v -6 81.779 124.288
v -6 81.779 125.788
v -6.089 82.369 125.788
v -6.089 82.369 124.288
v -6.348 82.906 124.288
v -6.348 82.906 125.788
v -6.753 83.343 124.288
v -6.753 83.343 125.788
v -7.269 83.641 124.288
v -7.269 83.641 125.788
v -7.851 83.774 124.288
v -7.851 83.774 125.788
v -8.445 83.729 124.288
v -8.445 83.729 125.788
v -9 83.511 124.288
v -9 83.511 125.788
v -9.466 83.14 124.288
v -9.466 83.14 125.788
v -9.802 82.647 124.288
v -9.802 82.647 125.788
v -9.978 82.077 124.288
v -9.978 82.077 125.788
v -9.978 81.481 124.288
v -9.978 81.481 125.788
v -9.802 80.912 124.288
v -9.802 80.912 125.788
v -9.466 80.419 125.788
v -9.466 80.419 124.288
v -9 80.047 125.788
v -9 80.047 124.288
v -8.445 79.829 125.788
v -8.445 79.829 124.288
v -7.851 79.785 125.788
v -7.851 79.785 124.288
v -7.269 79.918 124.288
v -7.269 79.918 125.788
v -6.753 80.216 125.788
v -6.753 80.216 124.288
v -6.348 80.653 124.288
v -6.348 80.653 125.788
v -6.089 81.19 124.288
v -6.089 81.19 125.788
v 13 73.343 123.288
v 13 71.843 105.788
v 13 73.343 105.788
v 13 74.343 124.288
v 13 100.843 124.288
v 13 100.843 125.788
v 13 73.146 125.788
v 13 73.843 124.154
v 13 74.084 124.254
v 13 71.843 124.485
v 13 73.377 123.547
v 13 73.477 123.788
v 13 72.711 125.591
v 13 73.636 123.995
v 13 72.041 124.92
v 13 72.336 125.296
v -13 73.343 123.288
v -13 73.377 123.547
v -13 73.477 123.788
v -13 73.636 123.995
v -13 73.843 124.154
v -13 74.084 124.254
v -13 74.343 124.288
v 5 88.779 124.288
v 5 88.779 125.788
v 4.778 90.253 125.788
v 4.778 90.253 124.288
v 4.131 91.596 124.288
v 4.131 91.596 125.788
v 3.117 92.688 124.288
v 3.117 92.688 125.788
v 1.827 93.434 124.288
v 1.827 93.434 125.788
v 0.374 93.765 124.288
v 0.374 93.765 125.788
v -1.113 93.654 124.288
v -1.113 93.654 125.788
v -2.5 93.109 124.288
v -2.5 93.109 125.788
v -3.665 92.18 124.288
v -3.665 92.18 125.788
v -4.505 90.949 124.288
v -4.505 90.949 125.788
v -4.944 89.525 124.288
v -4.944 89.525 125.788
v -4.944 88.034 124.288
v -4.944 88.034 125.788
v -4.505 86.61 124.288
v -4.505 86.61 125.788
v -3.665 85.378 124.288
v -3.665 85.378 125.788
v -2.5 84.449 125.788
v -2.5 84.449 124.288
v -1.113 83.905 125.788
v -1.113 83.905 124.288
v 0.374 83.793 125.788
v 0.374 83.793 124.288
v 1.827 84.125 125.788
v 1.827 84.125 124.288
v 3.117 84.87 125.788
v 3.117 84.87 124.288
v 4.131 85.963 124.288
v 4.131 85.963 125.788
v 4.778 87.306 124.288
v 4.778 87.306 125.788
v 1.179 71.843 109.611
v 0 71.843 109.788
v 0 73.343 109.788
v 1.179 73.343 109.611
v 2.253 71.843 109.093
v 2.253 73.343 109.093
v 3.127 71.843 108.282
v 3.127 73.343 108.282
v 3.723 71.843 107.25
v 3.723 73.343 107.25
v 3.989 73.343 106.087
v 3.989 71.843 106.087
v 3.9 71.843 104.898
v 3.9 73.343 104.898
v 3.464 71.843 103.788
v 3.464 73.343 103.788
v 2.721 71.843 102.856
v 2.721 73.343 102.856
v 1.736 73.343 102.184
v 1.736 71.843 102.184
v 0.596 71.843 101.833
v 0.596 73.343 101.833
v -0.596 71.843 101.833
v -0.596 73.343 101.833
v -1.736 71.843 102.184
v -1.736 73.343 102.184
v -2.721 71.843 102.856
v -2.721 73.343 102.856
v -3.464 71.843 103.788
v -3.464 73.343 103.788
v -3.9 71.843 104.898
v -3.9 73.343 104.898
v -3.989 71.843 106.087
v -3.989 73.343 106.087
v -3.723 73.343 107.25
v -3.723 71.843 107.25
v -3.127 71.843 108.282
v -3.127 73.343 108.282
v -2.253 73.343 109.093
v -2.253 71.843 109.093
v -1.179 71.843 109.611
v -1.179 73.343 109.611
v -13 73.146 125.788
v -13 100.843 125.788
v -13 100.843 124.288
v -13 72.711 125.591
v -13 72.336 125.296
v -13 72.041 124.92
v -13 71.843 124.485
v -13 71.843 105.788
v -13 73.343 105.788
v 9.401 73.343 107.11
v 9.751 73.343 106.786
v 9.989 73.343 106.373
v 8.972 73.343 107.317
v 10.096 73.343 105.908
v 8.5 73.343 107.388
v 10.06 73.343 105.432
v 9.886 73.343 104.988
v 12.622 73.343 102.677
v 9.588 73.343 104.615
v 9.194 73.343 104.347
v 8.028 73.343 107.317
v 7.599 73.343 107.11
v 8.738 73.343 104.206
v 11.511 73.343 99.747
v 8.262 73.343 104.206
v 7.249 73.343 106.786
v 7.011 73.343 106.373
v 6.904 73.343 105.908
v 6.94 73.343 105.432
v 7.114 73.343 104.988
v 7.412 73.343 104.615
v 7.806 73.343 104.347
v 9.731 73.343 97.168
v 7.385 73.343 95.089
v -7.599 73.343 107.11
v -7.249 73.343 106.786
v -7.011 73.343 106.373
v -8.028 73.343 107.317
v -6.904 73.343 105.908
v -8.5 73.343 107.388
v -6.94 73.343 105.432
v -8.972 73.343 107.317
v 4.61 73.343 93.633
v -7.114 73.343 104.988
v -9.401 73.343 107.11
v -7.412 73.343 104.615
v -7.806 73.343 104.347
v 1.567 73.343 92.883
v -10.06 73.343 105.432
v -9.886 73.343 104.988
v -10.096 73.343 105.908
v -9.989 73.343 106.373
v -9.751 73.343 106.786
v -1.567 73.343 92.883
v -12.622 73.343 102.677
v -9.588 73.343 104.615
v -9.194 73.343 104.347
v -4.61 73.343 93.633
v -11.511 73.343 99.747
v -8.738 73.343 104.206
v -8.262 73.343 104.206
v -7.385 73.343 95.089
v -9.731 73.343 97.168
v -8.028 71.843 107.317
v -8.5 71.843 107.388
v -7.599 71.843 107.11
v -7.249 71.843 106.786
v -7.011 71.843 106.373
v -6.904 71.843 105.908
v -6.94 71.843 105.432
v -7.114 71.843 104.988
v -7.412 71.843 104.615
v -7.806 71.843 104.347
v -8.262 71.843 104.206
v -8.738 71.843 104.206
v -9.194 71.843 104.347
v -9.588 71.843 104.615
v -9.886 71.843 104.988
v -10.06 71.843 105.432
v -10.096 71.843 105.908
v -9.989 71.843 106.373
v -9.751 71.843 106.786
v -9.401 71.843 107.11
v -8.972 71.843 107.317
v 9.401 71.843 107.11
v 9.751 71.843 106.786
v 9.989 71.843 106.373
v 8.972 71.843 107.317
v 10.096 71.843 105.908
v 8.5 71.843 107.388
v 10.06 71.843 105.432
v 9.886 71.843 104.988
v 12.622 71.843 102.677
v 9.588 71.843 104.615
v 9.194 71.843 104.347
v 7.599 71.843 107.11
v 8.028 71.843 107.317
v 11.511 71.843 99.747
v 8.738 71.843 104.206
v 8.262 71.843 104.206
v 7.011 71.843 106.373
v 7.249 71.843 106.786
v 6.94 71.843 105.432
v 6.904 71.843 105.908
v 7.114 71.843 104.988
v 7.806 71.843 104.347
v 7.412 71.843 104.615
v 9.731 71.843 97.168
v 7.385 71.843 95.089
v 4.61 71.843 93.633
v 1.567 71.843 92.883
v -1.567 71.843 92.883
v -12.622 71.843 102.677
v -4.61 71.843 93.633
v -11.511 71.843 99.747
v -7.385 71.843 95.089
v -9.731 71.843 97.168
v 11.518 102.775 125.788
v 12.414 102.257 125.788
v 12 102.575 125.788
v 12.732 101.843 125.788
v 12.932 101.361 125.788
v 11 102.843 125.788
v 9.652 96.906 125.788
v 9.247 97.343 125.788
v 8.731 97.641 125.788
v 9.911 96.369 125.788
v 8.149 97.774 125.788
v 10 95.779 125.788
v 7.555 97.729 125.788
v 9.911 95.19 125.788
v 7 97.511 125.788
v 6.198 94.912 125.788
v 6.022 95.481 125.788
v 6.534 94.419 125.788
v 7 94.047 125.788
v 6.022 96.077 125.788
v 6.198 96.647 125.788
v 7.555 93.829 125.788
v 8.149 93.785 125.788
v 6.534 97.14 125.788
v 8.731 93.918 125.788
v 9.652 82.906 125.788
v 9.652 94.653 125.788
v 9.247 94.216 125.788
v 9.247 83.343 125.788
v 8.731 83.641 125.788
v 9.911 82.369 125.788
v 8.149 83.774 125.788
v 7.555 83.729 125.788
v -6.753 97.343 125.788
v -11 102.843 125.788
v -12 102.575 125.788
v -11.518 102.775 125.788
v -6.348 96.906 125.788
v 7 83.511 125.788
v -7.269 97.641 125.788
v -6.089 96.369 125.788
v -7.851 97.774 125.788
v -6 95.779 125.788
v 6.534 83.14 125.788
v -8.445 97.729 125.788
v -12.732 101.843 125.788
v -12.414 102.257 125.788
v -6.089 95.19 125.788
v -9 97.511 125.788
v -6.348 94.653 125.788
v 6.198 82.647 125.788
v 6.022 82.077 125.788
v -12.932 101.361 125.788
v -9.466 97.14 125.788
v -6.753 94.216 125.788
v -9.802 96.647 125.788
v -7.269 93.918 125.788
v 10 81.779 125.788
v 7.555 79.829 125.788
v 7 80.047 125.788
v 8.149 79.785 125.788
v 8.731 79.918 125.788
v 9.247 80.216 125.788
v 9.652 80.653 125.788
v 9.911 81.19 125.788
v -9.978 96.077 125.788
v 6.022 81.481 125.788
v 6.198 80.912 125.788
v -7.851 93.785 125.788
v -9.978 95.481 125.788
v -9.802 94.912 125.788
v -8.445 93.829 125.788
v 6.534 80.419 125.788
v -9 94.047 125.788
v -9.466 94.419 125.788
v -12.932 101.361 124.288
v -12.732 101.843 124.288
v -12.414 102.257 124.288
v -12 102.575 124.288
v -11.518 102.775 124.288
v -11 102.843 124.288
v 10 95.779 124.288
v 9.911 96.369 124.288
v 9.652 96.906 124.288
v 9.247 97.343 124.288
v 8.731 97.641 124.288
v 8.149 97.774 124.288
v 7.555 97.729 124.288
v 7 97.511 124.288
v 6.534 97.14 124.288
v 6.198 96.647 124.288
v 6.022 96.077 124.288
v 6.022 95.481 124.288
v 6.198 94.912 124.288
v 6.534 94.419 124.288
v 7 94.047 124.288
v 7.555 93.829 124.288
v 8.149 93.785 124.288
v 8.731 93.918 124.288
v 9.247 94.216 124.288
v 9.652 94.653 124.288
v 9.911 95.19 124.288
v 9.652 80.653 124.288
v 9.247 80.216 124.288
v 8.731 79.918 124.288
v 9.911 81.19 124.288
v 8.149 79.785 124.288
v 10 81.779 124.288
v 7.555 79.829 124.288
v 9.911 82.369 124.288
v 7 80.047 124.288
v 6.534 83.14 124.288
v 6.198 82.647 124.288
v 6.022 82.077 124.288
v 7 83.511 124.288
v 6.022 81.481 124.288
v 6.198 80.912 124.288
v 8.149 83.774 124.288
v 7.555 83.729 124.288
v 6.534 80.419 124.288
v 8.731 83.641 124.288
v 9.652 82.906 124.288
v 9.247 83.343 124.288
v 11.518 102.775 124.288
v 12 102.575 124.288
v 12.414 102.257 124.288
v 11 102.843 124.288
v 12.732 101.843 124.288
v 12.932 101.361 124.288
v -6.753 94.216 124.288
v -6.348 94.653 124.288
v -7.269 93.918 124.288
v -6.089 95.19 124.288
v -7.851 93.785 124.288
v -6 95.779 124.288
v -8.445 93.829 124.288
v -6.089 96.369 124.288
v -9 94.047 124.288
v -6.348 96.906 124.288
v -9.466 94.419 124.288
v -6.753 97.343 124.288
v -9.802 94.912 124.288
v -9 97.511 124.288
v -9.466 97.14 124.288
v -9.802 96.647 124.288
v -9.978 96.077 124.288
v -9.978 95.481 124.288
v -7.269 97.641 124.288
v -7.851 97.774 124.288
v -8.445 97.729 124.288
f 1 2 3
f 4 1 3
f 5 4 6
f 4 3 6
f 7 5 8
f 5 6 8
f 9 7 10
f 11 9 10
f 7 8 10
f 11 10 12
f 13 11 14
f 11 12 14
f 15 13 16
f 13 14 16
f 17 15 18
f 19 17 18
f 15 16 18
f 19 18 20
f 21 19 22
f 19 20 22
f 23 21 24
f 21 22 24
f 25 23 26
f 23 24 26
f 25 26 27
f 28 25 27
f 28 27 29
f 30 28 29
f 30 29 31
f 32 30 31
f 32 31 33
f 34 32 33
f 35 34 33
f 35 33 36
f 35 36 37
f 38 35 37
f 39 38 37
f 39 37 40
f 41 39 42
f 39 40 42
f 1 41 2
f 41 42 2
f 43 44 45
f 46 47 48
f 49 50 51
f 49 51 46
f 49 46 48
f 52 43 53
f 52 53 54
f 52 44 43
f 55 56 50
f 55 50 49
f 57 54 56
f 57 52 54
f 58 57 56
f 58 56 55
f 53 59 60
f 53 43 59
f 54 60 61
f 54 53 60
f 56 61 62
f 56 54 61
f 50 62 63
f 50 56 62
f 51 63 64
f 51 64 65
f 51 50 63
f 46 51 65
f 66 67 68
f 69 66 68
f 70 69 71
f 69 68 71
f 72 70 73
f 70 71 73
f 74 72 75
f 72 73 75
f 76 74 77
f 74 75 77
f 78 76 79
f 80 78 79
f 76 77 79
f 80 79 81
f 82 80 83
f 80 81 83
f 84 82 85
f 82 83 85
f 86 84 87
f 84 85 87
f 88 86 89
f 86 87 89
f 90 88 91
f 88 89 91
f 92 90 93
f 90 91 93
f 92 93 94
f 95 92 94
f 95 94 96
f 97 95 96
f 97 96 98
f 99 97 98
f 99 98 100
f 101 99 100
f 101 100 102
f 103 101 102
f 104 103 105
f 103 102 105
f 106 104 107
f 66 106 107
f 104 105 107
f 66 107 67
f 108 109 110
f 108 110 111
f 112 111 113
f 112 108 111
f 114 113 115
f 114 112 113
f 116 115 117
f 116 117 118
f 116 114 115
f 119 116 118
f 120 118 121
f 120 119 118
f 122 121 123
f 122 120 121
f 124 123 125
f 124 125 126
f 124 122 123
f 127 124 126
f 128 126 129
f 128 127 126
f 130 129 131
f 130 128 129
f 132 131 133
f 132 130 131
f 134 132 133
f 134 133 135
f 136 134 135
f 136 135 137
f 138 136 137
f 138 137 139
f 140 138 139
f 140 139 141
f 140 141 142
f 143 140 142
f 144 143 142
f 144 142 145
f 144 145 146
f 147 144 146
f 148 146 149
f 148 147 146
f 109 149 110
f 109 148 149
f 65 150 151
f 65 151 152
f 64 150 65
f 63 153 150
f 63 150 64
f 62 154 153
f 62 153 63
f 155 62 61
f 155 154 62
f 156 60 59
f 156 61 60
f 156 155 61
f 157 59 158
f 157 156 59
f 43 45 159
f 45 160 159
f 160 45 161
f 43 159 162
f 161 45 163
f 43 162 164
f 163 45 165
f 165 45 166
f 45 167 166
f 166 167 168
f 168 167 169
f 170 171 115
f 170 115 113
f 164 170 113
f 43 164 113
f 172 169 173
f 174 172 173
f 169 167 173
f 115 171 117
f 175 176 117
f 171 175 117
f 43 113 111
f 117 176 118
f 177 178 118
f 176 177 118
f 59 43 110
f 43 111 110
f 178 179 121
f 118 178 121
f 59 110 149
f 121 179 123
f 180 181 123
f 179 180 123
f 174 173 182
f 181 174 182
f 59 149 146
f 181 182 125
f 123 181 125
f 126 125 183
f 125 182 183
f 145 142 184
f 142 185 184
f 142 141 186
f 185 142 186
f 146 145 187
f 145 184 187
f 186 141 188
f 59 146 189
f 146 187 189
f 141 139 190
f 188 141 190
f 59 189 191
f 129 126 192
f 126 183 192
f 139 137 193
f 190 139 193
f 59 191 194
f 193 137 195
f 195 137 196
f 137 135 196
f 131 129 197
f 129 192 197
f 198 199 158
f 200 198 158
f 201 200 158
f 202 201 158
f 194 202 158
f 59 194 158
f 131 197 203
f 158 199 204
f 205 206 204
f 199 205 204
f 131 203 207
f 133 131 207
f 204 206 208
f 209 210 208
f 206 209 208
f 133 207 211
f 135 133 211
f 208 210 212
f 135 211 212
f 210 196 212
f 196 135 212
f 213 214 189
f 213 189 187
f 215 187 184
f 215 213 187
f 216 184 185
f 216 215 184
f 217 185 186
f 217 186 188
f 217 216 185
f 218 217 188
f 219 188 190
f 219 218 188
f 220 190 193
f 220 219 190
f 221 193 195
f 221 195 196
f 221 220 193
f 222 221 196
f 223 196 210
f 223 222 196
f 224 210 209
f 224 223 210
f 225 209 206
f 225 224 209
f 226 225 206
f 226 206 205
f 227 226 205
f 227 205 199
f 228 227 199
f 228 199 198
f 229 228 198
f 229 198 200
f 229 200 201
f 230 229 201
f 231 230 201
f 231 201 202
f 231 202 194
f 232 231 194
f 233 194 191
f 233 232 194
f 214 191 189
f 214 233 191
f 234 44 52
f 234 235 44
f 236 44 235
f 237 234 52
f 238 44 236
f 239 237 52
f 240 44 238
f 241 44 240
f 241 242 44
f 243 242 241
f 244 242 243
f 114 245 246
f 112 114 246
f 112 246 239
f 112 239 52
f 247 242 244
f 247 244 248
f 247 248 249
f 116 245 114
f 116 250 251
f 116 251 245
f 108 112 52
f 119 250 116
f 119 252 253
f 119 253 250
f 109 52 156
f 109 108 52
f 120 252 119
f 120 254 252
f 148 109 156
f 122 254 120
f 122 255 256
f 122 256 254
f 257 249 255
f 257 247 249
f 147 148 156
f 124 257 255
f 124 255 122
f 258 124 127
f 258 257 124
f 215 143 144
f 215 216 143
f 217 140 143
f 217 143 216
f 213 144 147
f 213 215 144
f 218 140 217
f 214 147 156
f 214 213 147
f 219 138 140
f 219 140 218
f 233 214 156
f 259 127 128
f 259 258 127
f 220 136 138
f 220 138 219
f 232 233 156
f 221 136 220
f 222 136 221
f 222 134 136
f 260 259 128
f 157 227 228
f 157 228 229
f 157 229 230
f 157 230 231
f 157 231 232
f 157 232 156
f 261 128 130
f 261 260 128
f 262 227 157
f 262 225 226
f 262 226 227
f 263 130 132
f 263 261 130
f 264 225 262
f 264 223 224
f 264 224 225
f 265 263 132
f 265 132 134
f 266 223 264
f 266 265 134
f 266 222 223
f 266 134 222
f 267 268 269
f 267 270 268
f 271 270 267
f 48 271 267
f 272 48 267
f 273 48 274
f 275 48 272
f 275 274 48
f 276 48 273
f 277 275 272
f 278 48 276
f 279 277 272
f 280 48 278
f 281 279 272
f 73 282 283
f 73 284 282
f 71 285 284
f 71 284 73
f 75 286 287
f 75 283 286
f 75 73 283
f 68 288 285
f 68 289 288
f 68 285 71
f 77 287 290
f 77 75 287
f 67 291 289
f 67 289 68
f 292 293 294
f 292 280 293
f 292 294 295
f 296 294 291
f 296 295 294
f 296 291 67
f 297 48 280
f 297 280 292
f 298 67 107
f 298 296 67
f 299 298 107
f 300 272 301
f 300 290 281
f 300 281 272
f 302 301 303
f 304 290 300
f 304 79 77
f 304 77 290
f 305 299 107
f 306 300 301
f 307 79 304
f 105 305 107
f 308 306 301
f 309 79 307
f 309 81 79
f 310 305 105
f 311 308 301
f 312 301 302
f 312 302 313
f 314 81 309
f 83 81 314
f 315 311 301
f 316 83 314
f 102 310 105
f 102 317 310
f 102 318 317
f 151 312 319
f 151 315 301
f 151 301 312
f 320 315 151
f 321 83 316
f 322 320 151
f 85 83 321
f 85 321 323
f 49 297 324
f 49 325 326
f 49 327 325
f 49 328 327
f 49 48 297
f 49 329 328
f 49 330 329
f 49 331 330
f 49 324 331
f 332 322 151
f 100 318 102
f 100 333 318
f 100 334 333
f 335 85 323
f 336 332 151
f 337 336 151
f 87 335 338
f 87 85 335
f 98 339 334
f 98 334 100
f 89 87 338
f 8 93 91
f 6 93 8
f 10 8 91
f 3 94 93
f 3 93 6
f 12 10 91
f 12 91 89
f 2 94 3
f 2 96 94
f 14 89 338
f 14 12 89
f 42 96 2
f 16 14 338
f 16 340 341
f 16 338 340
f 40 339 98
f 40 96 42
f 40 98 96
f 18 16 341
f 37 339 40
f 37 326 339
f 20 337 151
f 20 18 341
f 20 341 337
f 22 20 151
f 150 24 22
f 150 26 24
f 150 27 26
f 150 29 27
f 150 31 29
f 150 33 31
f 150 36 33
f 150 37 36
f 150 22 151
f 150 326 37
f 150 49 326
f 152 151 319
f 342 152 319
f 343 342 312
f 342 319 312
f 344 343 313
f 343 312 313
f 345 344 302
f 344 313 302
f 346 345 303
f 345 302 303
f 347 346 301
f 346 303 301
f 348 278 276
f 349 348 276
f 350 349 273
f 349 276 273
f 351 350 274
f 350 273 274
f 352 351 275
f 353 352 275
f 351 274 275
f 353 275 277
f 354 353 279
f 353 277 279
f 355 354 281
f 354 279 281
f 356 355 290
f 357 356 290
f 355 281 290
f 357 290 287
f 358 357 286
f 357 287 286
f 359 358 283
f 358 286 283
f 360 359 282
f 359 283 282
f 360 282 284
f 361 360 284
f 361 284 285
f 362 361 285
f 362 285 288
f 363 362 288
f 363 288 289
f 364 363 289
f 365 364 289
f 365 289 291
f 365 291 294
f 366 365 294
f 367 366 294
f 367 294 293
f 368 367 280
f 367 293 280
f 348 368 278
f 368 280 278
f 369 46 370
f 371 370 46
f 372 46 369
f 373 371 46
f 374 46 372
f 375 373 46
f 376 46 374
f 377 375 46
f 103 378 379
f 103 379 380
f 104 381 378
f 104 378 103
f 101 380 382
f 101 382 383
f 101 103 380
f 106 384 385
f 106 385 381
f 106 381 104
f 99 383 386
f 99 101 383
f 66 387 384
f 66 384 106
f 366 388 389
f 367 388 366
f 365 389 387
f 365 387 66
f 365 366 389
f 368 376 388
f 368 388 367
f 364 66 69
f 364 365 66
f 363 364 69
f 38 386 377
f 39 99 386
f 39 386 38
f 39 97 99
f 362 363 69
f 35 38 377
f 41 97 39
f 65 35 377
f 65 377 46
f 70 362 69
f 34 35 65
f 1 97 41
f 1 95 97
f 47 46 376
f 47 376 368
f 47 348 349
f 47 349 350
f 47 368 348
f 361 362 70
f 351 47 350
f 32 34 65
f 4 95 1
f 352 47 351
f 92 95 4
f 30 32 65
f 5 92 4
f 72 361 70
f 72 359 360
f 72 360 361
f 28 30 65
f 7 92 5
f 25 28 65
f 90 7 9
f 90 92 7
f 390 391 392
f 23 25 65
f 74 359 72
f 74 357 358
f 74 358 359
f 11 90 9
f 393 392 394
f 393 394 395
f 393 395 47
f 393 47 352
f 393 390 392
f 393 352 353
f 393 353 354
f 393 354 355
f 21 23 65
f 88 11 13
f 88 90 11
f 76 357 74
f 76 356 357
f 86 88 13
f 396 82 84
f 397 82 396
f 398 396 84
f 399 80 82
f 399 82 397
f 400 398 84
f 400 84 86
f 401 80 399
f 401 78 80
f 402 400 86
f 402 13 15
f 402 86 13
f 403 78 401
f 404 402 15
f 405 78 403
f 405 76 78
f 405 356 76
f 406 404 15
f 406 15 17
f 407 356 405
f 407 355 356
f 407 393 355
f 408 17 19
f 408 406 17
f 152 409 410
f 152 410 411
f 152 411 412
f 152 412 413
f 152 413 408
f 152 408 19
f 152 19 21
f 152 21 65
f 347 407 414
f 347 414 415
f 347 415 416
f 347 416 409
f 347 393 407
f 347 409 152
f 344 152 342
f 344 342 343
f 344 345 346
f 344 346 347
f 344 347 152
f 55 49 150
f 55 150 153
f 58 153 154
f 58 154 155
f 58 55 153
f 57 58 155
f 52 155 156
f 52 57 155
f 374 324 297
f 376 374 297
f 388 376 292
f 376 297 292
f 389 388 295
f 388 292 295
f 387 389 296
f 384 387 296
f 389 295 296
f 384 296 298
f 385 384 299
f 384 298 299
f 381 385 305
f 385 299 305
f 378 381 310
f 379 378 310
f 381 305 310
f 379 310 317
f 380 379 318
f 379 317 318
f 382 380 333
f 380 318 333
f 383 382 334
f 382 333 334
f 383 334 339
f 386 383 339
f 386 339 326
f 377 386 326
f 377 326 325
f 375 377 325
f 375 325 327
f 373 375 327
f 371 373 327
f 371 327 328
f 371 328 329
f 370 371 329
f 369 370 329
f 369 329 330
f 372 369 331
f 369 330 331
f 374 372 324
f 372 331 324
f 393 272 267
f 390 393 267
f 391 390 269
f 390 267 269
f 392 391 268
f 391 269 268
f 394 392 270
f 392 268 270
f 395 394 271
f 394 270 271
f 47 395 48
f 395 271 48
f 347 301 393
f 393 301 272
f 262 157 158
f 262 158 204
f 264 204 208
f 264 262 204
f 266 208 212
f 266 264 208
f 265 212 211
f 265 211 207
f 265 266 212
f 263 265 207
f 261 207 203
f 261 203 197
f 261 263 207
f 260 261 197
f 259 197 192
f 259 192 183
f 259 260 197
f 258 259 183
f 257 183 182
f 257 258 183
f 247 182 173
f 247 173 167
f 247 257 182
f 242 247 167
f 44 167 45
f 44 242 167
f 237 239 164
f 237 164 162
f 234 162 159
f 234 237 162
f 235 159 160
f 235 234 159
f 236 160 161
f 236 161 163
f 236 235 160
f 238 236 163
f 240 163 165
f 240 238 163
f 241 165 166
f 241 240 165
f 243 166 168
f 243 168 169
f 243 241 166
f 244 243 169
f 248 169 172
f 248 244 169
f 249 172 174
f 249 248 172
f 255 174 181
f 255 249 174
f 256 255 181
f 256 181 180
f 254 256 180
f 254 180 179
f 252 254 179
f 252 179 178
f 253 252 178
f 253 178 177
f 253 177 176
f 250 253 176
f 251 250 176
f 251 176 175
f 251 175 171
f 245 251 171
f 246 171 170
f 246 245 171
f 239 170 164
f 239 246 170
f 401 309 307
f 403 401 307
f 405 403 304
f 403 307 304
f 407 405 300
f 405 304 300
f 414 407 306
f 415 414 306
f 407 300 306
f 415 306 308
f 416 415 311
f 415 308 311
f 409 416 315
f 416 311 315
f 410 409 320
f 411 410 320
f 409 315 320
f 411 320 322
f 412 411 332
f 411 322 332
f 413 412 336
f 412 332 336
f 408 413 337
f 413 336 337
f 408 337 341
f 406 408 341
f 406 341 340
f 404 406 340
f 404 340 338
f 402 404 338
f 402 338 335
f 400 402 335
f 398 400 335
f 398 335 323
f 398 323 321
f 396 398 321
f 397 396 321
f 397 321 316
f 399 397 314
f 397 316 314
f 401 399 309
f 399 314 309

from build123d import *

# Parameters (mm, degrees)
SKETCH1_R           = 40
SKETCH1_R_2         = 16
BOSS_EXTRUDE1_DEPTH = 15
SKETCH2_R           = 50
SKETCH2_R_2         = 20
BOSS_EXTRUDE2_DEPTH = 15
CUT_EXTRUDE2_START  = -260
CUT_EXTRUDE2_DEPTH  = 260
FILLET1_R           = 10
SCALE2_SCALE        = 0.1


# Read off the part's stored shape, not the designer's step: Cut-Extrude2
with BuildPart() as part:
    # Sketch1 → Boss-Extrude1 (new body)
    with BuildSketch(Plane(origin=(0, 0, 0), x_dir=(1, 0, 0), z_dir=(0, 1, 0))):
        with BuildLine():
            Line((-130, -200), (-130, 0))
            ThreePointArc((-130, 0), (0, 130), (130, 0))
            Line((130, 0), (130, -200))
            Line((130, -200), (-130, -200))
        make_face()
        with Locations(Location((0, 0, 0), (0, 0, 270))):
            Circle(SKETCH1_R, mode=Mode.SUBTRACT)
        with Locations(Location((-85, 0, 0), (0, 0, 270))):
            Circle(SKETCH1_R_2, mode=Mode.SUBTRACT)
        with Locations(Location((85, 0, 0), (0, 0, 270))):
            Circle(SKETCH1_R_2, mode=Mode.SUBTRACT)
    extrude(amount=BOSS_EXTRUDE1_DEPTH)

    # Sketch2 → Boss-Extrude2 (add)
    with BuildSketch(Plane.XY.offset(200)):
        with BuildLine():
            Line((-130, 0), (-130, 290))
            ThreePointArc((-130, 290), (-124.142135624, 304.142135624), (-110, 310))
            Line((-110, 310), (110, 310))
            ThreePointArc((110, 310), (124.142135624, 304.142135624), (130, 290))
            Line((130, 290), (130, 0))
            Line((130, 0), (-130, 0))
        make_face()
        with Locations((0, 169.361818375)):
            Circle(SKETCH2_R, mode=Mode.SUBTRACT)
        with Locations((80, 239.361818375)):
            Circle(SKETCH2_R_2, mode=Mode.SUBTRACT)
        with Locations((-80, 239.361818375)):
            Circle(SKETCH2_R_2, mode=Mode.SUBTRACT)
        with Locations((-80, 99.361818375)):
            Circle(SKETCH2_R_2, mode=Mode.SUBTRACT)
        with Locations((80, 99.361818375)):
            Circle(SKETCH2_R_2, mode=Mode.SUBTRACT)
    extrude(amount=-BOSS_EXTRUDE2_DEPTH)

    # Cut-Extrude2 outline → Cut-Extrude2 (cut)
    with BuildSketch(Plane.ZY.offset(130).offset(CUT_EXTRUDE2_START)):
        with BuildLine():
            ThreePointArc((200, 13.029030935), (195.075286181, 4.924713819), (186.970969065, 0))
            Line((186.970969065, 0), (200, 0))
            Line((200, 0), (200, 13.029030935))
        make_face()
    extrude(amount=CUT_EXTRUDE2_DEPTH, mode=Mode.SUBTRACT)

    # Fillet1
    fillet1_edges = [part.edges().sort_by_distance(p)[0] for p in [
        (0, 15, 185),
    ]]
    fillet(fillet1_edges, radius=FILLET1_R)


with BuildPart() as part_1:
    # Scale2: scaled about (0, 79.825718393, 117.542480981)
    add(part.part.scale(SCALE2_SCALE).moved(Location((0, 71.843146554, 105.788232883))))


solid = part_1.part
